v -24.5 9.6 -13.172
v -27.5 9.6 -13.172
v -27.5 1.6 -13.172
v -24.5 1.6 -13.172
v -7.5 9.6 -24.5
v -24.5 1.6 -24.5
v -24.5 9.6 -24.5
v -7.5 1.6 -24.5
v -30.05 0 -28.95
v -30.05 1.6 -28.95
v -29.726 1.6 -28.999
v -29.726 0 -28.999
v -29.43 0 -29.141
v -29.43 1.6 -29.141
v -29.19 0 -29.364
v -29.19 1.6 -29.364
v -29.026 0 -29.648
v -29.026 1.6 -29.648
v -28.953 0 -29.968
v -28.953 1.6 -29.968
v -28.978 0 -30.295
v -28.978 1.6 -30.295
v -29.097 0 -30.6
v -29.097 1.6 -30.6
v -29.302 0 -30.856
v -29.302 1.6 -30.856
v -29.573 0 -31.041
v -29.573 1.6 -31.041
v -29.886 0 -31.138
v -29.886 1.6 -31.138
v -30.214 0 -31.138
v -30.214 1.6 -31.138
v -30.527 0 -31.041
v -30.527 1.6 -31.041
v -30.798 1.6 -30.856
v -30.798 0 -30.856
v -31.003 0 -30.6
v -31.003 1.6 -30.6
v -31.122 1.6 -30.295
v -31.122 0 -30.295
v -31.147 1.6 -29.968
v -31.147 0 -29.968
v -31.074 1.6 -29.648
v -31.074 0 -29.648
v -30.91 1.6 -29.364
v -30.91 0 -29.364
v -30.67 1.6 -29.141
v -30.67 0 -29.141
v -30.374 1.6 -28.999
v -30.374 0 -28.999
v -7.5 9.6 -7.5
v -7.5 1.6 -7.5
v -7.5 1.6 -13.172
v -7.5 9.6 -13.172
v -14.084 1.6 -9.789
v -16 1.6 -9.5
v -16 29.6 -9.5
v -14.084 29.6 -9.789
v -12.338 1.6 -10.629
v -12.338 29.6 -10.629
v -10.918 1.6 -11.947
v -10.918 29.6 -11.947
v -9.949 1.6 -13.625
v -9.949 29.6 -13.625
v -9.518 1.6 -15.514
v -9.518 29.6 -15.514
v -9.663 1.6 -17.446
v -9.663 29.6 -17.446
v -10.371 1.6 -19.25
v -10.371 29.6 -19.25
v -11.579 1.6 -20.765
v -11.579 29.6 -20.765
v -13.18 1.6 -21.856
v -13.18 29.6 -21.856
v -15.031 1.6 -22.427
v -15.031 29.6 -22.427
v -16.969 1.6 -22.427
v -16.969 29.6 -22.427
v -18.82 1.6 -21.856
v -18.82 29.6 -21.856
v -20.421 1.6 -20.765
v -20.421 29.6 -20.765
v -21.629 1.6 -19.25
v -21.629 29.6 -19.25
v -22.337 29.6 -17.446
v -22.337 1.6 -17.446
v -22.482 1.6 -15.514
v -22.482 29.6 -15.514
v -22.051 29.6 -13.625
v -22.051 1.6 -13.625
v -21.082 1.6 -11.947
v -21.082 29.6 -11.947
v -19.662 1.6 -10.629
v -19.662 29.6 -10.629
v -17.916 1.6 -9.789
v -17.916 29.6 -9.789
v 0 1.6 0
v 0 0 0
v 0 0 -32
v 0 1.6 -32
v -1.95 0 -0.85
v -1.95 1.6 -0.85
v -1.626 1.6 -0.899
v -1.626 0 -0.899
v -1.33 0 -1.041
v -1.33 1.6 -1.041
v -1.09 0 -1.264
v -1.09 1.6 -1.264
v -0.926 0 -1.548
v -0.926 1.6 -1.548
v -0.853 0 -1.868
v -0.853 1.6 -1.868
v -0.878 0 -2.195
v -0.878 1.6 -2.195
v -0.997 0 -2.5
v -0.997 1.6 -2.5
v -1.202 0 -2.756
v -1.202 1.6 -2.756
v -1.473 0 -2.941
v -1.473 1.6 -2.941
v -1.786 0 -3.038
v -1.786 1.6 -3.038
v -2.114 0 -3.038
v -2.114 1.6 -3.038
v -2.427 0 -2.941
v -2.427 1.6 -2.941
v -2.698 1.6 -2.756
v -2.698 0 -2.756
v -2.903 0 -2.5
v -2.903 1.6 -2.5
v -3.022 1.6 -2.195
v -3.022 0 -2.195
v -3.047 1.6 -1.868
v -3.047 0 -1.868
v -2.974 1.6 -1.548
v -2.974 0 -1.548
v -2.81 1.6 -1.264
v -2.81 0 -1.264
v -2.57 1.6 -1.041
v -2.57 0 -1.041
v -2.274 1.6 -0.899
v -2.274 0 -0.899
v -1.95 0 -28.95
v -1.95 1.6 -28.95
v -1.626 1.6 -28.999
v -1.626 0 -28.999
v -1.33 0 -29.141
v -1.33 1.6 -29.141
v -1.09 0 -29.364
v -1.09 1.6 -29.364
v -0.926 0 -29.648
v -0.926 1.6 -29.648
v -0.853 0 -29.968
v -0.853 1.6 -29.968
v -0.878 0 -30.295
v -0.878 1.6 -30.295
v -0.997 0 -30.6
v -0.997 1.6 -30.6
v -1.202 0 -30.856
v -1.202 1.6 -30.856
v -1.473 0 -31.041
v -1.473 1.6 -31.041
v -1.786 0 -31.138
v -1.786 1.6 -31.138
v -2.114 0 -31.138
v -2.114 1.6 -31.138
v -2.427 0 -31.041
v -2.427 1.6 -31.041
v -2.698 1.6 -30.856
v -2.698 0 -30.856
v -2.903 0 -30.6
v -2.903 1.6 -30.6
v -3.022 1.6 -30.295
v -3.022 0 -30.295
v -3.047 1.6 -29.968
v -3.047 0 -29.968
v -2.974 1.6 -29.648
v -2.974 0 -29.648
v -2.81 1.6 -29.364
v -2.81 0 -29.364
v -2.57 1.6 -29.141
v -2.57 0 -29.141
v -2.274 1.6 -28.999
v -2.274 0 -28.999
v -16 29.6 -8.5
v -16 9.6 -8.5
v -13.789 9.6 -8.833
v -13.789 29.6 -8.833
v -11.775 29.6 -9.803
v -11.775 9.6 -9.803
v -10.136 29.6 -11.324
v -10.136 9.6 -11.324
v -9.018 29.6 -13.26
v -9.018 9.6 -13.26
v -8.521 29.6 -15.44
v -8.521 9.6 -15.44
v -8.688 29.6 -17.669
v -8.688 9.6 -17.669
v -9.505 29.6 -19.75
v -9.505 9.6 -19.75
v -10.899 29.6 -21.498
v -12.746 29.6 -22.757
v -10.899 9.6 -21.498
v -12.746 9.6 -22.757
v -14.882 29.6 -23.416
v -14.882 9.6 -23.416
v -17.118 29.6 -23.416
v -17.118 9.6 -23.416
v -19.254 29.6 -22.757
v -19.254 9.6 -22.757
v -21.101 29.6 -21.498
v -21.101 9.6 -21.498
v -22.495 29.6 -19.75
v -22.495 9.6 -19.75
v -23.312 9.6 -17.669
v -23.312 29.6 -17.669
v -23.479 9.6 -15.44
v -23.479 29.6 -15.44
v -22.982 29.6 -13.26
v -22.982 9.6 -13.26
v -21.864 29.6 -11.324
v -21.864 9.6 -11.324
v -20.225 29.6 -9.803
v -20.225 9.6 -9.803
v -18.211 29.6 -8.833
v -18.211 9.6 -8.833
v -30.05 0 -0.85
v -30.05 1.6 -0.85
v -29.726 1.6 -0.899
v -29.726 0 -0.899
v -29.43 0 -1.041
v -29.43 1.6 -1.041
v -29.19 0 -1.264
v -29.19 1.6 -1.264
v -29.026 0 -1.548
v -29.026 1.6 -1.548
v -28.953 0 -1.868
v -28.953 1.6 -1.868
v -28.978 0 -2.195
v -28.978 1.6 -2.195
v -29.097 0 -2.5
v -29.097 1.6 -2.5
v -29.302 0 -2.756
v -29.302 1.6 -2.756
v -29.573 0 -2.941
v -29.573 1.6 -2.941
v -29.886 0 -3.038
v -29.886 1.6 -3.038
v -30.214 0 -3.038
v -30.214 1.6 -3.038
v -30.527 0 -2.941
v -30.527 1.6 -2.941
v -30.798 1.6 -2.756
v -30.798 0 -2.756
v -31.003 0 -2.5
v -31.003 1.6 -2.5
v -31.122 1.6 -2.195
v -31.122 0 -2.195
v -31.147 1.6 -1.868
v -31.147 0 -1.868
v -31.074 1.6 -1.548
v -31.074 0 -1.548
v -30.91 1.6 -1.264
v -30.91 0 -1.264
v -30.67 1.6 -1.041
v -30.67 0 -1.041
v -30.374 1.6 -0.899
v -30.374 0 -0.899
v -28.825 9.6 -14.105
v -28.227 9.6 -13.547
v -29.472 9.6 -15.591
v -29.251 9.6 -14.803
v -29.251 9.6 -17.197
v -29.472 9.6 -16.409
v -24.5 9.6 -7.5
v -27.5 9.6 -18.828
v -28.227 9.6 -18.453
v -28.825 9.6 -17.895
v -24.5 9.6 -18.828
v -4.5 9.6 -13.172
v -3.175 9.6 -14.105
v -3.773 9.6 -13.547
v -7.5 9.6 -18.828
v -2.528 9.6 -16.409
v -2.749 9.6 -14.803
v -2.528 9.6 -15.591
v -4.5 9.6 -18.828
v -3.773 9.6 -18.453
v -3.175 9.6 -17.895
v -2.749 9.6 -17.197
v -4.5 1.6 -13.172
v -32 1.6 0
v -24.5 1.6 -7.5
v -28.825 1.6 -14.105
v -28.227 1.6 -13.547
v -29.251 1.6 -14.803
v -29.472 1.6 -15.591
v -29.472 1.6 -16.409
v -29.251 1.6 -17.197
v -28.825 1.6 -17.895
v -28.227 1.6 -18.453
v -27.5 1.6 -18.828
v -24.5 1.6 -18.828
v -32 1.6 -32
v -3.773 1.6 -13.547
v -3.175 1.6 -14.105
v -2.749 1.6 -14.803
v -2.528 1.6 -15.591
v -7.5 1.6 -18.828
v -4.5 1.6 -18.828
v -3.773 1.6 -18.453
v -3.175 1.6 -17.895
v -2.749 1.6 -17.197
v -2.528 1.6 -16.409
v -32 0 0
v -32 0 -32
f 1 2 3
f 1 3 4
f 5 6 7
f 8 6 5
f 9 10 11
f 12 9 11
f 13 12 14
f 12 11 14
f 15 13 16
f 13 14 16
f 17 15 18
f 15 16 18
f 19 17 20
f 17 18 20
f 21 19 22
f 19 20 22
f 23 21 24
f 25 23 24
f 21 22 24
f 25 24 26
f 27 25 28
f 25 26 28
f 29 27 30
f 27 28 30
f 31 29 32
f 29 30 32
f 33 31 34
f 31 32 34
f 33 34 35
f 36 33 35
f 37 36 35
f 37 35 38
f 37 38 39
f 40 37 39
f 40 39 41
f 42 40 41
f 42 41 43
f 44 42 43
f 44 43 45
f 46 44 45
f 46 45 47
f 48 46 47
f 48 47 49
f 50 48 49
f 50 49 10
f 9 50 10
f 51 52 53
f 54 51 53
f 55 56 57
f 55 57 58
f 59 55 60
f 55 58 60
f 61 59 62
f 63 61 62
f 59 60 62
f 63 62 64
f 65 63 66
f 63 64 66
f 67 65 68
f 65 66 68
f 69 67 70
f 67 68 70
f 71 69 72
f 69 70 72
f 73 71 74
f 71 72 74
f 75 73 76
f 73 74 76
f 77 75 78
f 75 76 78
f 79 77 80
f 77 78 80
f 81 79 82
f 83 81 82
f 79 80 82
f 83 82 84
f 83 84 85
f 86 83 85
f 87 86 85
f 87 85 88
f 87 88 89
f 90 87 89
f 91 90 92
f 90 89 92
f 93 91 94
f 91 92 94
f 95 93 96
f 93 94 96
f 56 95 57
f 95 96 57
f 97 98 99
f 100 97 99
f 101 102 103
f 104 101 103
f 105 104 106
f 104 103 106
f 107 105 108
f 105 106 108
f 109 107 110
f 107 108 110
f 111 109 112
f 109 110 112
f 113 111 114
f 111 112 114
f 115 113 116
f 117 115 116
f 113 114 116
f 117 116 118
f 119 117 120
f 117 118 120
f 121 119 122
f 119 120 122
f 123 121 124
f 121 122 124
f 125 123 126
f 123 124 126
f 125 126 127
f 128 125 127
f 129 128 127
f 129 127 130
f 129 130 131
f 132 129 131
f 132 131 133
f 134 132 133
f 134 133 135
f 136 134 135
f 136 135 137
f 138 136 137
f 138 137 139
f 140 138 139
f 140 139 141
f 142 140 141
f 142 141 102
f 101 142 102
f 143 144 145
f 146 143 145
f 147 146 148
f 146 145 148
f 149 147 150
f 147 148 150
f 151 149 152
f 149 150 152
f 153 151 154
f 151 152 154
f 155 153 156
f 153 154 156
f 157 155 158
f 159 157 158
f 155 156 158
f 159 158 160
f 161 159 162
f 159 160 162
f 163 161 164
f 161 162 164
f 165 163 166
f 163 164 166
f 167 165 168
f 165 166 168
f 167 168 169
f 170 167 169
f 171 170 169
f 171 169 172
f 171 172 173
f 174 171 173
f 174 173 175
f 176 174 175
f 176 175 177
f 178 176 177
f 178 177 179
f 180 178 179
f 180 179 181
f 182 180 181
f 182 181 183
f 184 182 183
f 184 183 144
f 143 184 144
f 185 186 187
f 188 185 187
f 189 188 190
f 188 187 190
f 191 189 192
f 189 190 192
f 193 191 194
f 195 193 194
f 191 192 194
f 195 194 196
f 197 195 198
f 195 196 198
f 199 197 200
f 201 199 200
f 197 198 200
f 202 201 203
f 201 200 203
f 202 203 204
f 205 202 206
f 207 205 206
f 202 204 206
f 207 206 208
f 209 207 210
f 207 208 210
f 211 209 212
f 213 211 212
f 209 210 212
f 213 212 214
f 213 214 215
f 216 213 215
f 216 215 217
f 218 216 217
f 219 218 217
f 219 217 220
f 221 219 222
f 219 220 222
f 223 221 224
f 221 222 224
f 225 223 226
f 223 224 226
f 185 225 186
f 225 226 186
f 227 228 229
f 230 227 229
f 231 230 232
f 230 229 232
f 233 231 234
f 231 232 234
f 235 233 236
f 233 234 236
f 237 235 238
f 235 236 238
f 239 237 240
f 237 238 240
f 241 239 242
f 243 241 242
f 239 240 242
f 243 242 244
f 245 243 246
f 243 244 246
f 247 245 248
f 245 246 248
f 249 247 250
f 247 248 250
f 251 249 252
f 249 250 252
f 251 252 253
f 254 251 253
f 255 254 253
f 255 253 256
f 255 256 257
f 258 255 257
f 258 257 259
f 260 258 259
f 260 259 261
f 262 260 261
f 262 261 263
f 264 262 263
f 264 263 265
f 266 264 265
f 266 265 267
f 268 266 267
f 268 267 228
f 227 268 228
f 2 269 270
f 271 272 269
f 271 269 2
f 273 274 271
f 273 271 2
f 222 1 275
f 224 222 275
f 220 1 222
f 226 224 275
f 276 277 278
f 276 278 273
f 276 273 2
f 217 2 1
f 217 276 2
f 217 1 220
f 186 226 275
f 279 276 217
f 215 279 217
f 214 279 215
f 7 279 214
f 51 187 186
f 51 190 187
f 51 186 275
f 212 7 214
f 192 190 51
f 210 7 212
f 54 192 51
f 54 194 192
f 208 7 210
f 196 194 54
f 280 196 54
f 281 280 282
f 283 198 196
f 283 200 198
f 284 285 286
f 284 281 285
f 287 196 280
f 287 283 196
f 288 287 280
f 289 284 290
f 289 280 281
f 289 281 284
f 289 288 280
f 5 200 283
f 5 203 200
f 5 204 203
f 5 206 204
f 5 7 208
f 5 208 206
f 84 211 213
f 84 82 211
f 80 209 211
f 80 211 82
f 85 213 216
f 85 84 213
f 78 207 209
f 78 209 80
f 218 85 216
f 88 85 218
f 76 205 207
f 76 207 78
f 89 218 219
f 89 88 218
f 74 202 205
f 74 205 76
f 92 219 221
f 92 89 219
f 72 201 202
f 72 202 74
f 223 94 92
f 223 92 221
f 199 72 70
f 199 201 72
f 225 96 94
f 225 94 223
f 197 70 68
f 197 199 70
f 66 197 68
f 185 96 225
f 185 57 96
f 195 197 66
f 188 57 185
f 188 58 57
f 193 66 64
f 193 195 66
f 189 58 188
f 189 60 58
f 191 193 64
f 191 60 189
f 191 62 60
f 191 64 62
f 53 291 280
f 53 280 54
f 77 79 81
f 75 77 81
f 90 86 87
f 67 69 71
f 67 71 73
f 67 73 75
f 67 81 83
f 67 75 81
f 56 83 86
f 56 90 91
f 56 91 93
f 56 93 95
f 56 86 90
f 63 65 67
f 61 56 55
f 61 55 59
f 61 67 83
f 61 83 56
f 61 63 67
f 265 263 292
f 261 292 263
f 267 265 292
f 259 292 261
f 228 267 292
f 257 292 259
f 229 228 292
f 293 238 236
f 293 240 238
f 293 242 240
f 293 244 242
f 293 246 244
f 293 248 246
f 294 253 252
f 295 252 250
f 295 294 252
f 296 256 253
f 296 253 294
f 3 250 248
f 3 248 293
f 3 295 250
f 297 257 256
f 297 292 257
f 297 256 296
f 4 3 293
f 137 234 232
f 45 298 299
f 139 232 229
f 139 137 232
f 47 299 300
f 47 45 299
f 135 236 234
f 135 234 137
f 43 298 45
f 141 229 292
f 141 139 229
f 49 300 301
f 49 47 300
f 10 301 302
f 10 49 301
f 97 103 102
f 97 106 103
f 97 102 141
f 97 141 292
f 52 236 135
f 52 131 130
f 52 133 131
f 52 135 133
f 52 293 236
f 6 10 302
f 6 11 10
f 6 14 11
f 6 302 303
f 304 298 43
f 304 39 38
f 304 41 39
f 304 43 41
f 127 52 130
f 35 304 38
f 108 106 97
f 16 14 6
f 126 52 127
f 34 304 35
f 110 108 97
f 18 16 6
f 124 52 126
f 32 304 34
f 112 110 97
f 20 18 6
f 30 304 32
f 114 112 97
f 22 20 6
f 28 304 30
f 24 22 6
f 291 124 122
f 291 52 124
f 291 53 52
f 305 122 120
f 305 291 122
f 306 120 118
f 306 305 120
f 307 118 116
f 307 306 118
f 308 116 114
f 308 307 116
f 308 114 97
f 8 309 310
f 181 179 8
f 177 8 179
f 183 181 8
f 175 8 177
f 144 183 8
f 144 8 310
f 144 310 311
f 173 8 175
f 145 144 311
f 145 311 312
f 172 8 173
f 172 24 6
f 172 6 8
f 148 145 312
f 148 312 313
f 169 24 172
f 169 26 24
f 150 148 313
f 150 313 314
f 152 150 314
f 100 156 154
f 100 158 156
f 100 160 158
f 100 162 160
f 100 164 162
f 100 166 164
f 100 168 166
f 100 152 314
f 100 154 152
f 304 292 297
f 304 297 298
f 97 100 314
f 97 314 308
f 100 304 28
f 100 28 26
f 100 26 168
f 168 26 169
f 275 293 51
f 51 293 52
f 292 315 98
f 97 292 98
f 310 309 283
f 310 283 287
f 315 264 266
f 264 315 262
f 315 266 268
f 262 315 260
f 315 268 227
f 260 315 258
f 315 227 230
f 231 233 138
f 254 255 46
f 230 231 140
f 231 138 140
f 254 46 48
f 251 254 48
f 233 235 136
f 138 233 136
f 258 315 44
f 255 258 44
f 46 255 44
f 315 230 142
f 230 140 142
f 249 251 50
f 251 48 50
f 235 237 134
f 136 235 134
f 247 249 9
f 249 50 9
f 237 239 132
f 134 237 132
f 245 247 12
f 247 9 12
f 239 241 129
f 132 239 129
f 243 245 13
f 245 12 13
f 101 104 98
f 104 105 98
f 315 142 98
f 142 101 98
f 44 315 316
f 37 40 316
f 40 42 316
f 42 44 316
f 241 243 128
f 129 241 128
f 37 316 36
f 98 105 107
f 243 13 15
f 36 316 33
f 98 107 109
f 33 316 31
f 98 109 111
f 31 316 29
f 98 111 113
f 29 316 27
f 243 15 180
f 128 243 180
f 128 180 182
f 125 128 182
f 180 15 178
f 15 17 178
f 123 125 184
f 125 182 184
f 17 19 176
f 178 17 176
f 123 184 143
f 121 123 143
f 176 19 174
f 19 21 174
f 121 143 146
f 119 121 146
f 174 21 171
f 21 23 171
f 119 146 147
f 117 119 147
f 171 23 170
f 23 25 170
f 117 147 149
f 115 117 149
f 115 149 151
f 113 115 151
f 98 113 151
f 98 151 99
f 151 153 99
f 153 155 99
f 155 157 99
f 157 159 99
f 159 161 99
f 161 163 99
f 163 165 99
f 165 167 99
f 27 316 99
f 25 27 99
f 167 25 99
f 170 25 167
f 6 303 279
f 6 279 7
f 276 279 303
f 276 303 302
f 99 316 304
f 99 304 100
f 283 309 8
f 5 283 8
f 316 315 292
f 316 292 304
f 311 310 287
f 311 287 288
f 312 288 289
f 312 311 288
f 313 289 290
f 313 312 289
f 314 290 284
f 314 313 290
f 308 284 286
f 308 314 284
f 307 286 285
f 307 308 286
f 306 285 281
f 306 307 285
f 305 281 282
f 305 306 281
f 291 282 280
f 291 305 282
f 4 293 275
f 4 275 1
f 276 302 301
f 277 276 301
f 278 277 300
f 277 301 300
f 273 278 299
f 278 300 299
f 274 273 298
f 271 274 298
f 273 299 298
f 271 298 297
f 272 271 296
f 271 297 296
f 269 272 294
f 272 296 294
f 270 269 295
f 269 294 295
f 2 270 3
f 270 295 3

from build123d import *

# Parameters (mm, degrees)
SKETCH1_W            = 32
SKETCH1_H            = 32
PCB_THICKNESS_DEPTH  = 1.6
SKETCH2_W            = 17
SKETCH2_H            = 17
LENS_1_DEPTH         = 8
SKETCH3_R            = 7.5
LENS_2_DEPTH         = 20
LENS_3_DEPTH         = 8
SKETCH7_R            = 6.5
LENS_4_DEPTH         = 28
SKETCH5_R            = 1.1
MOUNTING_HOLES_DEPTH = 54.216538783


with BuildPart() as part:
    # Sketch1 → pcb_thickness (new body)
    with BuildSketch(Plane(origin=(0, 0, 0), x_dir=(1, 0, 0), z_dir=(0, 1, 0))):
        with Locations((-16, 16)):
            Rectangle(SKETCH1_W, SKETCH1_H)
    extrude(amount=PCB_THICKNESS_DEPTH)

    # Sketch2 → lens_1 (add)
    with BuildSketch(Plane(origin=(0, 1.6, 0), x_dir=(1, 0, 0), z_dir=(0, 1, 0))):
        with Locations((-16, 16)):
            Rectangle(SKETCH2_W, SKETCH2_H)
    extrude(amount=LENS_1_DEPTH)

    # Sketch3 → lens_2 (add)
    with BuildSketch(Plane(origin=(0, 9.6, 0), x_dir=(1, 0, 0), z_dir=(0, 1, 0))):
        with Locations(Location((-16, 16, 0), (0, 0, 270))):
            Circle(SKETCH3_R)
    extrude(amount=LENS_2_DEPTH)

    # Sketch6 → lens_3 (add)
    with BuildSketch(Plane(origin=(0, 1.6, 0), x_dir=(1, 0, 0), z_dir=(0, 1, 0))):
        with BuildLine():
            Line((-24.5, 18.828427125), (-27.5, 18.828427125))
            ThreePointArc((-27.5, 18.828427125), (-29.5, 16), (-27.5, 13.171572875))
            Line((-27.5, 13.171572875), (-24.5, 13.171572875))
            Line((-24.5, 13.171572875), (-24.5, 18.828427125))
        make_face()
        with BuildLine():
            Line((-7.5, 18.828427125), (-4.5, 18.828427125))
            ThreePointArc((-4.5, 18.828427125), (-2.5, 16), (-4.5, 13.171572875))
            Line((-4.5, 13.171572875), (-7.5, 13.171572875))
            Line((-7.5, 13.171572875), (-7.5, 18.828427125))
        make_face()
    extrude(amount=LENS_3_DEPTH)

    # Sketch7 → lens_4 (cut)
    with BuildSketch(Plane(origin=(0, 29.6, 0), x_dir=(1, 0, 0), z_dir=(0, 1, 0))):
        with Locations(Location((-16, 16, 0), (0, 0, 270))):
            Circle(SKETCH7_R)
    extrude(amount=-LENS_4_DEPTH, mode=Mode.SUBTRACT)

    # Sketch5 → mounting_holes (cut, through all)
    with BuildSketch(Plane(origin=(0, 1.6, 0), x_dir=(1, 0, 0), z_dir=(0, 1, 0))):
        with Locations(Location((-30.050000926, 30.050000926, 0), (0, 0, 270))):
            Circle(SKETCH5_R)
        with Locations(Location((-1.950000926, 30.049999074, 0), (0, 0, 270))):
            Circle(SKETCH5_R)
        with Locations(Location((-1.949999074, 1.949999074, 0), (0, 0, 270))):
            Circle(SKETCH5_R)
        with Locations(Location((-30.049999074, 1.950000926, 0), (0, 0, 270))):
            Circle(SKETCH5_R)
    extrude(amount=-MOUNTING_HOLES_DEPTH, mode=Mode.SUBTRACT)


solid = part.part
